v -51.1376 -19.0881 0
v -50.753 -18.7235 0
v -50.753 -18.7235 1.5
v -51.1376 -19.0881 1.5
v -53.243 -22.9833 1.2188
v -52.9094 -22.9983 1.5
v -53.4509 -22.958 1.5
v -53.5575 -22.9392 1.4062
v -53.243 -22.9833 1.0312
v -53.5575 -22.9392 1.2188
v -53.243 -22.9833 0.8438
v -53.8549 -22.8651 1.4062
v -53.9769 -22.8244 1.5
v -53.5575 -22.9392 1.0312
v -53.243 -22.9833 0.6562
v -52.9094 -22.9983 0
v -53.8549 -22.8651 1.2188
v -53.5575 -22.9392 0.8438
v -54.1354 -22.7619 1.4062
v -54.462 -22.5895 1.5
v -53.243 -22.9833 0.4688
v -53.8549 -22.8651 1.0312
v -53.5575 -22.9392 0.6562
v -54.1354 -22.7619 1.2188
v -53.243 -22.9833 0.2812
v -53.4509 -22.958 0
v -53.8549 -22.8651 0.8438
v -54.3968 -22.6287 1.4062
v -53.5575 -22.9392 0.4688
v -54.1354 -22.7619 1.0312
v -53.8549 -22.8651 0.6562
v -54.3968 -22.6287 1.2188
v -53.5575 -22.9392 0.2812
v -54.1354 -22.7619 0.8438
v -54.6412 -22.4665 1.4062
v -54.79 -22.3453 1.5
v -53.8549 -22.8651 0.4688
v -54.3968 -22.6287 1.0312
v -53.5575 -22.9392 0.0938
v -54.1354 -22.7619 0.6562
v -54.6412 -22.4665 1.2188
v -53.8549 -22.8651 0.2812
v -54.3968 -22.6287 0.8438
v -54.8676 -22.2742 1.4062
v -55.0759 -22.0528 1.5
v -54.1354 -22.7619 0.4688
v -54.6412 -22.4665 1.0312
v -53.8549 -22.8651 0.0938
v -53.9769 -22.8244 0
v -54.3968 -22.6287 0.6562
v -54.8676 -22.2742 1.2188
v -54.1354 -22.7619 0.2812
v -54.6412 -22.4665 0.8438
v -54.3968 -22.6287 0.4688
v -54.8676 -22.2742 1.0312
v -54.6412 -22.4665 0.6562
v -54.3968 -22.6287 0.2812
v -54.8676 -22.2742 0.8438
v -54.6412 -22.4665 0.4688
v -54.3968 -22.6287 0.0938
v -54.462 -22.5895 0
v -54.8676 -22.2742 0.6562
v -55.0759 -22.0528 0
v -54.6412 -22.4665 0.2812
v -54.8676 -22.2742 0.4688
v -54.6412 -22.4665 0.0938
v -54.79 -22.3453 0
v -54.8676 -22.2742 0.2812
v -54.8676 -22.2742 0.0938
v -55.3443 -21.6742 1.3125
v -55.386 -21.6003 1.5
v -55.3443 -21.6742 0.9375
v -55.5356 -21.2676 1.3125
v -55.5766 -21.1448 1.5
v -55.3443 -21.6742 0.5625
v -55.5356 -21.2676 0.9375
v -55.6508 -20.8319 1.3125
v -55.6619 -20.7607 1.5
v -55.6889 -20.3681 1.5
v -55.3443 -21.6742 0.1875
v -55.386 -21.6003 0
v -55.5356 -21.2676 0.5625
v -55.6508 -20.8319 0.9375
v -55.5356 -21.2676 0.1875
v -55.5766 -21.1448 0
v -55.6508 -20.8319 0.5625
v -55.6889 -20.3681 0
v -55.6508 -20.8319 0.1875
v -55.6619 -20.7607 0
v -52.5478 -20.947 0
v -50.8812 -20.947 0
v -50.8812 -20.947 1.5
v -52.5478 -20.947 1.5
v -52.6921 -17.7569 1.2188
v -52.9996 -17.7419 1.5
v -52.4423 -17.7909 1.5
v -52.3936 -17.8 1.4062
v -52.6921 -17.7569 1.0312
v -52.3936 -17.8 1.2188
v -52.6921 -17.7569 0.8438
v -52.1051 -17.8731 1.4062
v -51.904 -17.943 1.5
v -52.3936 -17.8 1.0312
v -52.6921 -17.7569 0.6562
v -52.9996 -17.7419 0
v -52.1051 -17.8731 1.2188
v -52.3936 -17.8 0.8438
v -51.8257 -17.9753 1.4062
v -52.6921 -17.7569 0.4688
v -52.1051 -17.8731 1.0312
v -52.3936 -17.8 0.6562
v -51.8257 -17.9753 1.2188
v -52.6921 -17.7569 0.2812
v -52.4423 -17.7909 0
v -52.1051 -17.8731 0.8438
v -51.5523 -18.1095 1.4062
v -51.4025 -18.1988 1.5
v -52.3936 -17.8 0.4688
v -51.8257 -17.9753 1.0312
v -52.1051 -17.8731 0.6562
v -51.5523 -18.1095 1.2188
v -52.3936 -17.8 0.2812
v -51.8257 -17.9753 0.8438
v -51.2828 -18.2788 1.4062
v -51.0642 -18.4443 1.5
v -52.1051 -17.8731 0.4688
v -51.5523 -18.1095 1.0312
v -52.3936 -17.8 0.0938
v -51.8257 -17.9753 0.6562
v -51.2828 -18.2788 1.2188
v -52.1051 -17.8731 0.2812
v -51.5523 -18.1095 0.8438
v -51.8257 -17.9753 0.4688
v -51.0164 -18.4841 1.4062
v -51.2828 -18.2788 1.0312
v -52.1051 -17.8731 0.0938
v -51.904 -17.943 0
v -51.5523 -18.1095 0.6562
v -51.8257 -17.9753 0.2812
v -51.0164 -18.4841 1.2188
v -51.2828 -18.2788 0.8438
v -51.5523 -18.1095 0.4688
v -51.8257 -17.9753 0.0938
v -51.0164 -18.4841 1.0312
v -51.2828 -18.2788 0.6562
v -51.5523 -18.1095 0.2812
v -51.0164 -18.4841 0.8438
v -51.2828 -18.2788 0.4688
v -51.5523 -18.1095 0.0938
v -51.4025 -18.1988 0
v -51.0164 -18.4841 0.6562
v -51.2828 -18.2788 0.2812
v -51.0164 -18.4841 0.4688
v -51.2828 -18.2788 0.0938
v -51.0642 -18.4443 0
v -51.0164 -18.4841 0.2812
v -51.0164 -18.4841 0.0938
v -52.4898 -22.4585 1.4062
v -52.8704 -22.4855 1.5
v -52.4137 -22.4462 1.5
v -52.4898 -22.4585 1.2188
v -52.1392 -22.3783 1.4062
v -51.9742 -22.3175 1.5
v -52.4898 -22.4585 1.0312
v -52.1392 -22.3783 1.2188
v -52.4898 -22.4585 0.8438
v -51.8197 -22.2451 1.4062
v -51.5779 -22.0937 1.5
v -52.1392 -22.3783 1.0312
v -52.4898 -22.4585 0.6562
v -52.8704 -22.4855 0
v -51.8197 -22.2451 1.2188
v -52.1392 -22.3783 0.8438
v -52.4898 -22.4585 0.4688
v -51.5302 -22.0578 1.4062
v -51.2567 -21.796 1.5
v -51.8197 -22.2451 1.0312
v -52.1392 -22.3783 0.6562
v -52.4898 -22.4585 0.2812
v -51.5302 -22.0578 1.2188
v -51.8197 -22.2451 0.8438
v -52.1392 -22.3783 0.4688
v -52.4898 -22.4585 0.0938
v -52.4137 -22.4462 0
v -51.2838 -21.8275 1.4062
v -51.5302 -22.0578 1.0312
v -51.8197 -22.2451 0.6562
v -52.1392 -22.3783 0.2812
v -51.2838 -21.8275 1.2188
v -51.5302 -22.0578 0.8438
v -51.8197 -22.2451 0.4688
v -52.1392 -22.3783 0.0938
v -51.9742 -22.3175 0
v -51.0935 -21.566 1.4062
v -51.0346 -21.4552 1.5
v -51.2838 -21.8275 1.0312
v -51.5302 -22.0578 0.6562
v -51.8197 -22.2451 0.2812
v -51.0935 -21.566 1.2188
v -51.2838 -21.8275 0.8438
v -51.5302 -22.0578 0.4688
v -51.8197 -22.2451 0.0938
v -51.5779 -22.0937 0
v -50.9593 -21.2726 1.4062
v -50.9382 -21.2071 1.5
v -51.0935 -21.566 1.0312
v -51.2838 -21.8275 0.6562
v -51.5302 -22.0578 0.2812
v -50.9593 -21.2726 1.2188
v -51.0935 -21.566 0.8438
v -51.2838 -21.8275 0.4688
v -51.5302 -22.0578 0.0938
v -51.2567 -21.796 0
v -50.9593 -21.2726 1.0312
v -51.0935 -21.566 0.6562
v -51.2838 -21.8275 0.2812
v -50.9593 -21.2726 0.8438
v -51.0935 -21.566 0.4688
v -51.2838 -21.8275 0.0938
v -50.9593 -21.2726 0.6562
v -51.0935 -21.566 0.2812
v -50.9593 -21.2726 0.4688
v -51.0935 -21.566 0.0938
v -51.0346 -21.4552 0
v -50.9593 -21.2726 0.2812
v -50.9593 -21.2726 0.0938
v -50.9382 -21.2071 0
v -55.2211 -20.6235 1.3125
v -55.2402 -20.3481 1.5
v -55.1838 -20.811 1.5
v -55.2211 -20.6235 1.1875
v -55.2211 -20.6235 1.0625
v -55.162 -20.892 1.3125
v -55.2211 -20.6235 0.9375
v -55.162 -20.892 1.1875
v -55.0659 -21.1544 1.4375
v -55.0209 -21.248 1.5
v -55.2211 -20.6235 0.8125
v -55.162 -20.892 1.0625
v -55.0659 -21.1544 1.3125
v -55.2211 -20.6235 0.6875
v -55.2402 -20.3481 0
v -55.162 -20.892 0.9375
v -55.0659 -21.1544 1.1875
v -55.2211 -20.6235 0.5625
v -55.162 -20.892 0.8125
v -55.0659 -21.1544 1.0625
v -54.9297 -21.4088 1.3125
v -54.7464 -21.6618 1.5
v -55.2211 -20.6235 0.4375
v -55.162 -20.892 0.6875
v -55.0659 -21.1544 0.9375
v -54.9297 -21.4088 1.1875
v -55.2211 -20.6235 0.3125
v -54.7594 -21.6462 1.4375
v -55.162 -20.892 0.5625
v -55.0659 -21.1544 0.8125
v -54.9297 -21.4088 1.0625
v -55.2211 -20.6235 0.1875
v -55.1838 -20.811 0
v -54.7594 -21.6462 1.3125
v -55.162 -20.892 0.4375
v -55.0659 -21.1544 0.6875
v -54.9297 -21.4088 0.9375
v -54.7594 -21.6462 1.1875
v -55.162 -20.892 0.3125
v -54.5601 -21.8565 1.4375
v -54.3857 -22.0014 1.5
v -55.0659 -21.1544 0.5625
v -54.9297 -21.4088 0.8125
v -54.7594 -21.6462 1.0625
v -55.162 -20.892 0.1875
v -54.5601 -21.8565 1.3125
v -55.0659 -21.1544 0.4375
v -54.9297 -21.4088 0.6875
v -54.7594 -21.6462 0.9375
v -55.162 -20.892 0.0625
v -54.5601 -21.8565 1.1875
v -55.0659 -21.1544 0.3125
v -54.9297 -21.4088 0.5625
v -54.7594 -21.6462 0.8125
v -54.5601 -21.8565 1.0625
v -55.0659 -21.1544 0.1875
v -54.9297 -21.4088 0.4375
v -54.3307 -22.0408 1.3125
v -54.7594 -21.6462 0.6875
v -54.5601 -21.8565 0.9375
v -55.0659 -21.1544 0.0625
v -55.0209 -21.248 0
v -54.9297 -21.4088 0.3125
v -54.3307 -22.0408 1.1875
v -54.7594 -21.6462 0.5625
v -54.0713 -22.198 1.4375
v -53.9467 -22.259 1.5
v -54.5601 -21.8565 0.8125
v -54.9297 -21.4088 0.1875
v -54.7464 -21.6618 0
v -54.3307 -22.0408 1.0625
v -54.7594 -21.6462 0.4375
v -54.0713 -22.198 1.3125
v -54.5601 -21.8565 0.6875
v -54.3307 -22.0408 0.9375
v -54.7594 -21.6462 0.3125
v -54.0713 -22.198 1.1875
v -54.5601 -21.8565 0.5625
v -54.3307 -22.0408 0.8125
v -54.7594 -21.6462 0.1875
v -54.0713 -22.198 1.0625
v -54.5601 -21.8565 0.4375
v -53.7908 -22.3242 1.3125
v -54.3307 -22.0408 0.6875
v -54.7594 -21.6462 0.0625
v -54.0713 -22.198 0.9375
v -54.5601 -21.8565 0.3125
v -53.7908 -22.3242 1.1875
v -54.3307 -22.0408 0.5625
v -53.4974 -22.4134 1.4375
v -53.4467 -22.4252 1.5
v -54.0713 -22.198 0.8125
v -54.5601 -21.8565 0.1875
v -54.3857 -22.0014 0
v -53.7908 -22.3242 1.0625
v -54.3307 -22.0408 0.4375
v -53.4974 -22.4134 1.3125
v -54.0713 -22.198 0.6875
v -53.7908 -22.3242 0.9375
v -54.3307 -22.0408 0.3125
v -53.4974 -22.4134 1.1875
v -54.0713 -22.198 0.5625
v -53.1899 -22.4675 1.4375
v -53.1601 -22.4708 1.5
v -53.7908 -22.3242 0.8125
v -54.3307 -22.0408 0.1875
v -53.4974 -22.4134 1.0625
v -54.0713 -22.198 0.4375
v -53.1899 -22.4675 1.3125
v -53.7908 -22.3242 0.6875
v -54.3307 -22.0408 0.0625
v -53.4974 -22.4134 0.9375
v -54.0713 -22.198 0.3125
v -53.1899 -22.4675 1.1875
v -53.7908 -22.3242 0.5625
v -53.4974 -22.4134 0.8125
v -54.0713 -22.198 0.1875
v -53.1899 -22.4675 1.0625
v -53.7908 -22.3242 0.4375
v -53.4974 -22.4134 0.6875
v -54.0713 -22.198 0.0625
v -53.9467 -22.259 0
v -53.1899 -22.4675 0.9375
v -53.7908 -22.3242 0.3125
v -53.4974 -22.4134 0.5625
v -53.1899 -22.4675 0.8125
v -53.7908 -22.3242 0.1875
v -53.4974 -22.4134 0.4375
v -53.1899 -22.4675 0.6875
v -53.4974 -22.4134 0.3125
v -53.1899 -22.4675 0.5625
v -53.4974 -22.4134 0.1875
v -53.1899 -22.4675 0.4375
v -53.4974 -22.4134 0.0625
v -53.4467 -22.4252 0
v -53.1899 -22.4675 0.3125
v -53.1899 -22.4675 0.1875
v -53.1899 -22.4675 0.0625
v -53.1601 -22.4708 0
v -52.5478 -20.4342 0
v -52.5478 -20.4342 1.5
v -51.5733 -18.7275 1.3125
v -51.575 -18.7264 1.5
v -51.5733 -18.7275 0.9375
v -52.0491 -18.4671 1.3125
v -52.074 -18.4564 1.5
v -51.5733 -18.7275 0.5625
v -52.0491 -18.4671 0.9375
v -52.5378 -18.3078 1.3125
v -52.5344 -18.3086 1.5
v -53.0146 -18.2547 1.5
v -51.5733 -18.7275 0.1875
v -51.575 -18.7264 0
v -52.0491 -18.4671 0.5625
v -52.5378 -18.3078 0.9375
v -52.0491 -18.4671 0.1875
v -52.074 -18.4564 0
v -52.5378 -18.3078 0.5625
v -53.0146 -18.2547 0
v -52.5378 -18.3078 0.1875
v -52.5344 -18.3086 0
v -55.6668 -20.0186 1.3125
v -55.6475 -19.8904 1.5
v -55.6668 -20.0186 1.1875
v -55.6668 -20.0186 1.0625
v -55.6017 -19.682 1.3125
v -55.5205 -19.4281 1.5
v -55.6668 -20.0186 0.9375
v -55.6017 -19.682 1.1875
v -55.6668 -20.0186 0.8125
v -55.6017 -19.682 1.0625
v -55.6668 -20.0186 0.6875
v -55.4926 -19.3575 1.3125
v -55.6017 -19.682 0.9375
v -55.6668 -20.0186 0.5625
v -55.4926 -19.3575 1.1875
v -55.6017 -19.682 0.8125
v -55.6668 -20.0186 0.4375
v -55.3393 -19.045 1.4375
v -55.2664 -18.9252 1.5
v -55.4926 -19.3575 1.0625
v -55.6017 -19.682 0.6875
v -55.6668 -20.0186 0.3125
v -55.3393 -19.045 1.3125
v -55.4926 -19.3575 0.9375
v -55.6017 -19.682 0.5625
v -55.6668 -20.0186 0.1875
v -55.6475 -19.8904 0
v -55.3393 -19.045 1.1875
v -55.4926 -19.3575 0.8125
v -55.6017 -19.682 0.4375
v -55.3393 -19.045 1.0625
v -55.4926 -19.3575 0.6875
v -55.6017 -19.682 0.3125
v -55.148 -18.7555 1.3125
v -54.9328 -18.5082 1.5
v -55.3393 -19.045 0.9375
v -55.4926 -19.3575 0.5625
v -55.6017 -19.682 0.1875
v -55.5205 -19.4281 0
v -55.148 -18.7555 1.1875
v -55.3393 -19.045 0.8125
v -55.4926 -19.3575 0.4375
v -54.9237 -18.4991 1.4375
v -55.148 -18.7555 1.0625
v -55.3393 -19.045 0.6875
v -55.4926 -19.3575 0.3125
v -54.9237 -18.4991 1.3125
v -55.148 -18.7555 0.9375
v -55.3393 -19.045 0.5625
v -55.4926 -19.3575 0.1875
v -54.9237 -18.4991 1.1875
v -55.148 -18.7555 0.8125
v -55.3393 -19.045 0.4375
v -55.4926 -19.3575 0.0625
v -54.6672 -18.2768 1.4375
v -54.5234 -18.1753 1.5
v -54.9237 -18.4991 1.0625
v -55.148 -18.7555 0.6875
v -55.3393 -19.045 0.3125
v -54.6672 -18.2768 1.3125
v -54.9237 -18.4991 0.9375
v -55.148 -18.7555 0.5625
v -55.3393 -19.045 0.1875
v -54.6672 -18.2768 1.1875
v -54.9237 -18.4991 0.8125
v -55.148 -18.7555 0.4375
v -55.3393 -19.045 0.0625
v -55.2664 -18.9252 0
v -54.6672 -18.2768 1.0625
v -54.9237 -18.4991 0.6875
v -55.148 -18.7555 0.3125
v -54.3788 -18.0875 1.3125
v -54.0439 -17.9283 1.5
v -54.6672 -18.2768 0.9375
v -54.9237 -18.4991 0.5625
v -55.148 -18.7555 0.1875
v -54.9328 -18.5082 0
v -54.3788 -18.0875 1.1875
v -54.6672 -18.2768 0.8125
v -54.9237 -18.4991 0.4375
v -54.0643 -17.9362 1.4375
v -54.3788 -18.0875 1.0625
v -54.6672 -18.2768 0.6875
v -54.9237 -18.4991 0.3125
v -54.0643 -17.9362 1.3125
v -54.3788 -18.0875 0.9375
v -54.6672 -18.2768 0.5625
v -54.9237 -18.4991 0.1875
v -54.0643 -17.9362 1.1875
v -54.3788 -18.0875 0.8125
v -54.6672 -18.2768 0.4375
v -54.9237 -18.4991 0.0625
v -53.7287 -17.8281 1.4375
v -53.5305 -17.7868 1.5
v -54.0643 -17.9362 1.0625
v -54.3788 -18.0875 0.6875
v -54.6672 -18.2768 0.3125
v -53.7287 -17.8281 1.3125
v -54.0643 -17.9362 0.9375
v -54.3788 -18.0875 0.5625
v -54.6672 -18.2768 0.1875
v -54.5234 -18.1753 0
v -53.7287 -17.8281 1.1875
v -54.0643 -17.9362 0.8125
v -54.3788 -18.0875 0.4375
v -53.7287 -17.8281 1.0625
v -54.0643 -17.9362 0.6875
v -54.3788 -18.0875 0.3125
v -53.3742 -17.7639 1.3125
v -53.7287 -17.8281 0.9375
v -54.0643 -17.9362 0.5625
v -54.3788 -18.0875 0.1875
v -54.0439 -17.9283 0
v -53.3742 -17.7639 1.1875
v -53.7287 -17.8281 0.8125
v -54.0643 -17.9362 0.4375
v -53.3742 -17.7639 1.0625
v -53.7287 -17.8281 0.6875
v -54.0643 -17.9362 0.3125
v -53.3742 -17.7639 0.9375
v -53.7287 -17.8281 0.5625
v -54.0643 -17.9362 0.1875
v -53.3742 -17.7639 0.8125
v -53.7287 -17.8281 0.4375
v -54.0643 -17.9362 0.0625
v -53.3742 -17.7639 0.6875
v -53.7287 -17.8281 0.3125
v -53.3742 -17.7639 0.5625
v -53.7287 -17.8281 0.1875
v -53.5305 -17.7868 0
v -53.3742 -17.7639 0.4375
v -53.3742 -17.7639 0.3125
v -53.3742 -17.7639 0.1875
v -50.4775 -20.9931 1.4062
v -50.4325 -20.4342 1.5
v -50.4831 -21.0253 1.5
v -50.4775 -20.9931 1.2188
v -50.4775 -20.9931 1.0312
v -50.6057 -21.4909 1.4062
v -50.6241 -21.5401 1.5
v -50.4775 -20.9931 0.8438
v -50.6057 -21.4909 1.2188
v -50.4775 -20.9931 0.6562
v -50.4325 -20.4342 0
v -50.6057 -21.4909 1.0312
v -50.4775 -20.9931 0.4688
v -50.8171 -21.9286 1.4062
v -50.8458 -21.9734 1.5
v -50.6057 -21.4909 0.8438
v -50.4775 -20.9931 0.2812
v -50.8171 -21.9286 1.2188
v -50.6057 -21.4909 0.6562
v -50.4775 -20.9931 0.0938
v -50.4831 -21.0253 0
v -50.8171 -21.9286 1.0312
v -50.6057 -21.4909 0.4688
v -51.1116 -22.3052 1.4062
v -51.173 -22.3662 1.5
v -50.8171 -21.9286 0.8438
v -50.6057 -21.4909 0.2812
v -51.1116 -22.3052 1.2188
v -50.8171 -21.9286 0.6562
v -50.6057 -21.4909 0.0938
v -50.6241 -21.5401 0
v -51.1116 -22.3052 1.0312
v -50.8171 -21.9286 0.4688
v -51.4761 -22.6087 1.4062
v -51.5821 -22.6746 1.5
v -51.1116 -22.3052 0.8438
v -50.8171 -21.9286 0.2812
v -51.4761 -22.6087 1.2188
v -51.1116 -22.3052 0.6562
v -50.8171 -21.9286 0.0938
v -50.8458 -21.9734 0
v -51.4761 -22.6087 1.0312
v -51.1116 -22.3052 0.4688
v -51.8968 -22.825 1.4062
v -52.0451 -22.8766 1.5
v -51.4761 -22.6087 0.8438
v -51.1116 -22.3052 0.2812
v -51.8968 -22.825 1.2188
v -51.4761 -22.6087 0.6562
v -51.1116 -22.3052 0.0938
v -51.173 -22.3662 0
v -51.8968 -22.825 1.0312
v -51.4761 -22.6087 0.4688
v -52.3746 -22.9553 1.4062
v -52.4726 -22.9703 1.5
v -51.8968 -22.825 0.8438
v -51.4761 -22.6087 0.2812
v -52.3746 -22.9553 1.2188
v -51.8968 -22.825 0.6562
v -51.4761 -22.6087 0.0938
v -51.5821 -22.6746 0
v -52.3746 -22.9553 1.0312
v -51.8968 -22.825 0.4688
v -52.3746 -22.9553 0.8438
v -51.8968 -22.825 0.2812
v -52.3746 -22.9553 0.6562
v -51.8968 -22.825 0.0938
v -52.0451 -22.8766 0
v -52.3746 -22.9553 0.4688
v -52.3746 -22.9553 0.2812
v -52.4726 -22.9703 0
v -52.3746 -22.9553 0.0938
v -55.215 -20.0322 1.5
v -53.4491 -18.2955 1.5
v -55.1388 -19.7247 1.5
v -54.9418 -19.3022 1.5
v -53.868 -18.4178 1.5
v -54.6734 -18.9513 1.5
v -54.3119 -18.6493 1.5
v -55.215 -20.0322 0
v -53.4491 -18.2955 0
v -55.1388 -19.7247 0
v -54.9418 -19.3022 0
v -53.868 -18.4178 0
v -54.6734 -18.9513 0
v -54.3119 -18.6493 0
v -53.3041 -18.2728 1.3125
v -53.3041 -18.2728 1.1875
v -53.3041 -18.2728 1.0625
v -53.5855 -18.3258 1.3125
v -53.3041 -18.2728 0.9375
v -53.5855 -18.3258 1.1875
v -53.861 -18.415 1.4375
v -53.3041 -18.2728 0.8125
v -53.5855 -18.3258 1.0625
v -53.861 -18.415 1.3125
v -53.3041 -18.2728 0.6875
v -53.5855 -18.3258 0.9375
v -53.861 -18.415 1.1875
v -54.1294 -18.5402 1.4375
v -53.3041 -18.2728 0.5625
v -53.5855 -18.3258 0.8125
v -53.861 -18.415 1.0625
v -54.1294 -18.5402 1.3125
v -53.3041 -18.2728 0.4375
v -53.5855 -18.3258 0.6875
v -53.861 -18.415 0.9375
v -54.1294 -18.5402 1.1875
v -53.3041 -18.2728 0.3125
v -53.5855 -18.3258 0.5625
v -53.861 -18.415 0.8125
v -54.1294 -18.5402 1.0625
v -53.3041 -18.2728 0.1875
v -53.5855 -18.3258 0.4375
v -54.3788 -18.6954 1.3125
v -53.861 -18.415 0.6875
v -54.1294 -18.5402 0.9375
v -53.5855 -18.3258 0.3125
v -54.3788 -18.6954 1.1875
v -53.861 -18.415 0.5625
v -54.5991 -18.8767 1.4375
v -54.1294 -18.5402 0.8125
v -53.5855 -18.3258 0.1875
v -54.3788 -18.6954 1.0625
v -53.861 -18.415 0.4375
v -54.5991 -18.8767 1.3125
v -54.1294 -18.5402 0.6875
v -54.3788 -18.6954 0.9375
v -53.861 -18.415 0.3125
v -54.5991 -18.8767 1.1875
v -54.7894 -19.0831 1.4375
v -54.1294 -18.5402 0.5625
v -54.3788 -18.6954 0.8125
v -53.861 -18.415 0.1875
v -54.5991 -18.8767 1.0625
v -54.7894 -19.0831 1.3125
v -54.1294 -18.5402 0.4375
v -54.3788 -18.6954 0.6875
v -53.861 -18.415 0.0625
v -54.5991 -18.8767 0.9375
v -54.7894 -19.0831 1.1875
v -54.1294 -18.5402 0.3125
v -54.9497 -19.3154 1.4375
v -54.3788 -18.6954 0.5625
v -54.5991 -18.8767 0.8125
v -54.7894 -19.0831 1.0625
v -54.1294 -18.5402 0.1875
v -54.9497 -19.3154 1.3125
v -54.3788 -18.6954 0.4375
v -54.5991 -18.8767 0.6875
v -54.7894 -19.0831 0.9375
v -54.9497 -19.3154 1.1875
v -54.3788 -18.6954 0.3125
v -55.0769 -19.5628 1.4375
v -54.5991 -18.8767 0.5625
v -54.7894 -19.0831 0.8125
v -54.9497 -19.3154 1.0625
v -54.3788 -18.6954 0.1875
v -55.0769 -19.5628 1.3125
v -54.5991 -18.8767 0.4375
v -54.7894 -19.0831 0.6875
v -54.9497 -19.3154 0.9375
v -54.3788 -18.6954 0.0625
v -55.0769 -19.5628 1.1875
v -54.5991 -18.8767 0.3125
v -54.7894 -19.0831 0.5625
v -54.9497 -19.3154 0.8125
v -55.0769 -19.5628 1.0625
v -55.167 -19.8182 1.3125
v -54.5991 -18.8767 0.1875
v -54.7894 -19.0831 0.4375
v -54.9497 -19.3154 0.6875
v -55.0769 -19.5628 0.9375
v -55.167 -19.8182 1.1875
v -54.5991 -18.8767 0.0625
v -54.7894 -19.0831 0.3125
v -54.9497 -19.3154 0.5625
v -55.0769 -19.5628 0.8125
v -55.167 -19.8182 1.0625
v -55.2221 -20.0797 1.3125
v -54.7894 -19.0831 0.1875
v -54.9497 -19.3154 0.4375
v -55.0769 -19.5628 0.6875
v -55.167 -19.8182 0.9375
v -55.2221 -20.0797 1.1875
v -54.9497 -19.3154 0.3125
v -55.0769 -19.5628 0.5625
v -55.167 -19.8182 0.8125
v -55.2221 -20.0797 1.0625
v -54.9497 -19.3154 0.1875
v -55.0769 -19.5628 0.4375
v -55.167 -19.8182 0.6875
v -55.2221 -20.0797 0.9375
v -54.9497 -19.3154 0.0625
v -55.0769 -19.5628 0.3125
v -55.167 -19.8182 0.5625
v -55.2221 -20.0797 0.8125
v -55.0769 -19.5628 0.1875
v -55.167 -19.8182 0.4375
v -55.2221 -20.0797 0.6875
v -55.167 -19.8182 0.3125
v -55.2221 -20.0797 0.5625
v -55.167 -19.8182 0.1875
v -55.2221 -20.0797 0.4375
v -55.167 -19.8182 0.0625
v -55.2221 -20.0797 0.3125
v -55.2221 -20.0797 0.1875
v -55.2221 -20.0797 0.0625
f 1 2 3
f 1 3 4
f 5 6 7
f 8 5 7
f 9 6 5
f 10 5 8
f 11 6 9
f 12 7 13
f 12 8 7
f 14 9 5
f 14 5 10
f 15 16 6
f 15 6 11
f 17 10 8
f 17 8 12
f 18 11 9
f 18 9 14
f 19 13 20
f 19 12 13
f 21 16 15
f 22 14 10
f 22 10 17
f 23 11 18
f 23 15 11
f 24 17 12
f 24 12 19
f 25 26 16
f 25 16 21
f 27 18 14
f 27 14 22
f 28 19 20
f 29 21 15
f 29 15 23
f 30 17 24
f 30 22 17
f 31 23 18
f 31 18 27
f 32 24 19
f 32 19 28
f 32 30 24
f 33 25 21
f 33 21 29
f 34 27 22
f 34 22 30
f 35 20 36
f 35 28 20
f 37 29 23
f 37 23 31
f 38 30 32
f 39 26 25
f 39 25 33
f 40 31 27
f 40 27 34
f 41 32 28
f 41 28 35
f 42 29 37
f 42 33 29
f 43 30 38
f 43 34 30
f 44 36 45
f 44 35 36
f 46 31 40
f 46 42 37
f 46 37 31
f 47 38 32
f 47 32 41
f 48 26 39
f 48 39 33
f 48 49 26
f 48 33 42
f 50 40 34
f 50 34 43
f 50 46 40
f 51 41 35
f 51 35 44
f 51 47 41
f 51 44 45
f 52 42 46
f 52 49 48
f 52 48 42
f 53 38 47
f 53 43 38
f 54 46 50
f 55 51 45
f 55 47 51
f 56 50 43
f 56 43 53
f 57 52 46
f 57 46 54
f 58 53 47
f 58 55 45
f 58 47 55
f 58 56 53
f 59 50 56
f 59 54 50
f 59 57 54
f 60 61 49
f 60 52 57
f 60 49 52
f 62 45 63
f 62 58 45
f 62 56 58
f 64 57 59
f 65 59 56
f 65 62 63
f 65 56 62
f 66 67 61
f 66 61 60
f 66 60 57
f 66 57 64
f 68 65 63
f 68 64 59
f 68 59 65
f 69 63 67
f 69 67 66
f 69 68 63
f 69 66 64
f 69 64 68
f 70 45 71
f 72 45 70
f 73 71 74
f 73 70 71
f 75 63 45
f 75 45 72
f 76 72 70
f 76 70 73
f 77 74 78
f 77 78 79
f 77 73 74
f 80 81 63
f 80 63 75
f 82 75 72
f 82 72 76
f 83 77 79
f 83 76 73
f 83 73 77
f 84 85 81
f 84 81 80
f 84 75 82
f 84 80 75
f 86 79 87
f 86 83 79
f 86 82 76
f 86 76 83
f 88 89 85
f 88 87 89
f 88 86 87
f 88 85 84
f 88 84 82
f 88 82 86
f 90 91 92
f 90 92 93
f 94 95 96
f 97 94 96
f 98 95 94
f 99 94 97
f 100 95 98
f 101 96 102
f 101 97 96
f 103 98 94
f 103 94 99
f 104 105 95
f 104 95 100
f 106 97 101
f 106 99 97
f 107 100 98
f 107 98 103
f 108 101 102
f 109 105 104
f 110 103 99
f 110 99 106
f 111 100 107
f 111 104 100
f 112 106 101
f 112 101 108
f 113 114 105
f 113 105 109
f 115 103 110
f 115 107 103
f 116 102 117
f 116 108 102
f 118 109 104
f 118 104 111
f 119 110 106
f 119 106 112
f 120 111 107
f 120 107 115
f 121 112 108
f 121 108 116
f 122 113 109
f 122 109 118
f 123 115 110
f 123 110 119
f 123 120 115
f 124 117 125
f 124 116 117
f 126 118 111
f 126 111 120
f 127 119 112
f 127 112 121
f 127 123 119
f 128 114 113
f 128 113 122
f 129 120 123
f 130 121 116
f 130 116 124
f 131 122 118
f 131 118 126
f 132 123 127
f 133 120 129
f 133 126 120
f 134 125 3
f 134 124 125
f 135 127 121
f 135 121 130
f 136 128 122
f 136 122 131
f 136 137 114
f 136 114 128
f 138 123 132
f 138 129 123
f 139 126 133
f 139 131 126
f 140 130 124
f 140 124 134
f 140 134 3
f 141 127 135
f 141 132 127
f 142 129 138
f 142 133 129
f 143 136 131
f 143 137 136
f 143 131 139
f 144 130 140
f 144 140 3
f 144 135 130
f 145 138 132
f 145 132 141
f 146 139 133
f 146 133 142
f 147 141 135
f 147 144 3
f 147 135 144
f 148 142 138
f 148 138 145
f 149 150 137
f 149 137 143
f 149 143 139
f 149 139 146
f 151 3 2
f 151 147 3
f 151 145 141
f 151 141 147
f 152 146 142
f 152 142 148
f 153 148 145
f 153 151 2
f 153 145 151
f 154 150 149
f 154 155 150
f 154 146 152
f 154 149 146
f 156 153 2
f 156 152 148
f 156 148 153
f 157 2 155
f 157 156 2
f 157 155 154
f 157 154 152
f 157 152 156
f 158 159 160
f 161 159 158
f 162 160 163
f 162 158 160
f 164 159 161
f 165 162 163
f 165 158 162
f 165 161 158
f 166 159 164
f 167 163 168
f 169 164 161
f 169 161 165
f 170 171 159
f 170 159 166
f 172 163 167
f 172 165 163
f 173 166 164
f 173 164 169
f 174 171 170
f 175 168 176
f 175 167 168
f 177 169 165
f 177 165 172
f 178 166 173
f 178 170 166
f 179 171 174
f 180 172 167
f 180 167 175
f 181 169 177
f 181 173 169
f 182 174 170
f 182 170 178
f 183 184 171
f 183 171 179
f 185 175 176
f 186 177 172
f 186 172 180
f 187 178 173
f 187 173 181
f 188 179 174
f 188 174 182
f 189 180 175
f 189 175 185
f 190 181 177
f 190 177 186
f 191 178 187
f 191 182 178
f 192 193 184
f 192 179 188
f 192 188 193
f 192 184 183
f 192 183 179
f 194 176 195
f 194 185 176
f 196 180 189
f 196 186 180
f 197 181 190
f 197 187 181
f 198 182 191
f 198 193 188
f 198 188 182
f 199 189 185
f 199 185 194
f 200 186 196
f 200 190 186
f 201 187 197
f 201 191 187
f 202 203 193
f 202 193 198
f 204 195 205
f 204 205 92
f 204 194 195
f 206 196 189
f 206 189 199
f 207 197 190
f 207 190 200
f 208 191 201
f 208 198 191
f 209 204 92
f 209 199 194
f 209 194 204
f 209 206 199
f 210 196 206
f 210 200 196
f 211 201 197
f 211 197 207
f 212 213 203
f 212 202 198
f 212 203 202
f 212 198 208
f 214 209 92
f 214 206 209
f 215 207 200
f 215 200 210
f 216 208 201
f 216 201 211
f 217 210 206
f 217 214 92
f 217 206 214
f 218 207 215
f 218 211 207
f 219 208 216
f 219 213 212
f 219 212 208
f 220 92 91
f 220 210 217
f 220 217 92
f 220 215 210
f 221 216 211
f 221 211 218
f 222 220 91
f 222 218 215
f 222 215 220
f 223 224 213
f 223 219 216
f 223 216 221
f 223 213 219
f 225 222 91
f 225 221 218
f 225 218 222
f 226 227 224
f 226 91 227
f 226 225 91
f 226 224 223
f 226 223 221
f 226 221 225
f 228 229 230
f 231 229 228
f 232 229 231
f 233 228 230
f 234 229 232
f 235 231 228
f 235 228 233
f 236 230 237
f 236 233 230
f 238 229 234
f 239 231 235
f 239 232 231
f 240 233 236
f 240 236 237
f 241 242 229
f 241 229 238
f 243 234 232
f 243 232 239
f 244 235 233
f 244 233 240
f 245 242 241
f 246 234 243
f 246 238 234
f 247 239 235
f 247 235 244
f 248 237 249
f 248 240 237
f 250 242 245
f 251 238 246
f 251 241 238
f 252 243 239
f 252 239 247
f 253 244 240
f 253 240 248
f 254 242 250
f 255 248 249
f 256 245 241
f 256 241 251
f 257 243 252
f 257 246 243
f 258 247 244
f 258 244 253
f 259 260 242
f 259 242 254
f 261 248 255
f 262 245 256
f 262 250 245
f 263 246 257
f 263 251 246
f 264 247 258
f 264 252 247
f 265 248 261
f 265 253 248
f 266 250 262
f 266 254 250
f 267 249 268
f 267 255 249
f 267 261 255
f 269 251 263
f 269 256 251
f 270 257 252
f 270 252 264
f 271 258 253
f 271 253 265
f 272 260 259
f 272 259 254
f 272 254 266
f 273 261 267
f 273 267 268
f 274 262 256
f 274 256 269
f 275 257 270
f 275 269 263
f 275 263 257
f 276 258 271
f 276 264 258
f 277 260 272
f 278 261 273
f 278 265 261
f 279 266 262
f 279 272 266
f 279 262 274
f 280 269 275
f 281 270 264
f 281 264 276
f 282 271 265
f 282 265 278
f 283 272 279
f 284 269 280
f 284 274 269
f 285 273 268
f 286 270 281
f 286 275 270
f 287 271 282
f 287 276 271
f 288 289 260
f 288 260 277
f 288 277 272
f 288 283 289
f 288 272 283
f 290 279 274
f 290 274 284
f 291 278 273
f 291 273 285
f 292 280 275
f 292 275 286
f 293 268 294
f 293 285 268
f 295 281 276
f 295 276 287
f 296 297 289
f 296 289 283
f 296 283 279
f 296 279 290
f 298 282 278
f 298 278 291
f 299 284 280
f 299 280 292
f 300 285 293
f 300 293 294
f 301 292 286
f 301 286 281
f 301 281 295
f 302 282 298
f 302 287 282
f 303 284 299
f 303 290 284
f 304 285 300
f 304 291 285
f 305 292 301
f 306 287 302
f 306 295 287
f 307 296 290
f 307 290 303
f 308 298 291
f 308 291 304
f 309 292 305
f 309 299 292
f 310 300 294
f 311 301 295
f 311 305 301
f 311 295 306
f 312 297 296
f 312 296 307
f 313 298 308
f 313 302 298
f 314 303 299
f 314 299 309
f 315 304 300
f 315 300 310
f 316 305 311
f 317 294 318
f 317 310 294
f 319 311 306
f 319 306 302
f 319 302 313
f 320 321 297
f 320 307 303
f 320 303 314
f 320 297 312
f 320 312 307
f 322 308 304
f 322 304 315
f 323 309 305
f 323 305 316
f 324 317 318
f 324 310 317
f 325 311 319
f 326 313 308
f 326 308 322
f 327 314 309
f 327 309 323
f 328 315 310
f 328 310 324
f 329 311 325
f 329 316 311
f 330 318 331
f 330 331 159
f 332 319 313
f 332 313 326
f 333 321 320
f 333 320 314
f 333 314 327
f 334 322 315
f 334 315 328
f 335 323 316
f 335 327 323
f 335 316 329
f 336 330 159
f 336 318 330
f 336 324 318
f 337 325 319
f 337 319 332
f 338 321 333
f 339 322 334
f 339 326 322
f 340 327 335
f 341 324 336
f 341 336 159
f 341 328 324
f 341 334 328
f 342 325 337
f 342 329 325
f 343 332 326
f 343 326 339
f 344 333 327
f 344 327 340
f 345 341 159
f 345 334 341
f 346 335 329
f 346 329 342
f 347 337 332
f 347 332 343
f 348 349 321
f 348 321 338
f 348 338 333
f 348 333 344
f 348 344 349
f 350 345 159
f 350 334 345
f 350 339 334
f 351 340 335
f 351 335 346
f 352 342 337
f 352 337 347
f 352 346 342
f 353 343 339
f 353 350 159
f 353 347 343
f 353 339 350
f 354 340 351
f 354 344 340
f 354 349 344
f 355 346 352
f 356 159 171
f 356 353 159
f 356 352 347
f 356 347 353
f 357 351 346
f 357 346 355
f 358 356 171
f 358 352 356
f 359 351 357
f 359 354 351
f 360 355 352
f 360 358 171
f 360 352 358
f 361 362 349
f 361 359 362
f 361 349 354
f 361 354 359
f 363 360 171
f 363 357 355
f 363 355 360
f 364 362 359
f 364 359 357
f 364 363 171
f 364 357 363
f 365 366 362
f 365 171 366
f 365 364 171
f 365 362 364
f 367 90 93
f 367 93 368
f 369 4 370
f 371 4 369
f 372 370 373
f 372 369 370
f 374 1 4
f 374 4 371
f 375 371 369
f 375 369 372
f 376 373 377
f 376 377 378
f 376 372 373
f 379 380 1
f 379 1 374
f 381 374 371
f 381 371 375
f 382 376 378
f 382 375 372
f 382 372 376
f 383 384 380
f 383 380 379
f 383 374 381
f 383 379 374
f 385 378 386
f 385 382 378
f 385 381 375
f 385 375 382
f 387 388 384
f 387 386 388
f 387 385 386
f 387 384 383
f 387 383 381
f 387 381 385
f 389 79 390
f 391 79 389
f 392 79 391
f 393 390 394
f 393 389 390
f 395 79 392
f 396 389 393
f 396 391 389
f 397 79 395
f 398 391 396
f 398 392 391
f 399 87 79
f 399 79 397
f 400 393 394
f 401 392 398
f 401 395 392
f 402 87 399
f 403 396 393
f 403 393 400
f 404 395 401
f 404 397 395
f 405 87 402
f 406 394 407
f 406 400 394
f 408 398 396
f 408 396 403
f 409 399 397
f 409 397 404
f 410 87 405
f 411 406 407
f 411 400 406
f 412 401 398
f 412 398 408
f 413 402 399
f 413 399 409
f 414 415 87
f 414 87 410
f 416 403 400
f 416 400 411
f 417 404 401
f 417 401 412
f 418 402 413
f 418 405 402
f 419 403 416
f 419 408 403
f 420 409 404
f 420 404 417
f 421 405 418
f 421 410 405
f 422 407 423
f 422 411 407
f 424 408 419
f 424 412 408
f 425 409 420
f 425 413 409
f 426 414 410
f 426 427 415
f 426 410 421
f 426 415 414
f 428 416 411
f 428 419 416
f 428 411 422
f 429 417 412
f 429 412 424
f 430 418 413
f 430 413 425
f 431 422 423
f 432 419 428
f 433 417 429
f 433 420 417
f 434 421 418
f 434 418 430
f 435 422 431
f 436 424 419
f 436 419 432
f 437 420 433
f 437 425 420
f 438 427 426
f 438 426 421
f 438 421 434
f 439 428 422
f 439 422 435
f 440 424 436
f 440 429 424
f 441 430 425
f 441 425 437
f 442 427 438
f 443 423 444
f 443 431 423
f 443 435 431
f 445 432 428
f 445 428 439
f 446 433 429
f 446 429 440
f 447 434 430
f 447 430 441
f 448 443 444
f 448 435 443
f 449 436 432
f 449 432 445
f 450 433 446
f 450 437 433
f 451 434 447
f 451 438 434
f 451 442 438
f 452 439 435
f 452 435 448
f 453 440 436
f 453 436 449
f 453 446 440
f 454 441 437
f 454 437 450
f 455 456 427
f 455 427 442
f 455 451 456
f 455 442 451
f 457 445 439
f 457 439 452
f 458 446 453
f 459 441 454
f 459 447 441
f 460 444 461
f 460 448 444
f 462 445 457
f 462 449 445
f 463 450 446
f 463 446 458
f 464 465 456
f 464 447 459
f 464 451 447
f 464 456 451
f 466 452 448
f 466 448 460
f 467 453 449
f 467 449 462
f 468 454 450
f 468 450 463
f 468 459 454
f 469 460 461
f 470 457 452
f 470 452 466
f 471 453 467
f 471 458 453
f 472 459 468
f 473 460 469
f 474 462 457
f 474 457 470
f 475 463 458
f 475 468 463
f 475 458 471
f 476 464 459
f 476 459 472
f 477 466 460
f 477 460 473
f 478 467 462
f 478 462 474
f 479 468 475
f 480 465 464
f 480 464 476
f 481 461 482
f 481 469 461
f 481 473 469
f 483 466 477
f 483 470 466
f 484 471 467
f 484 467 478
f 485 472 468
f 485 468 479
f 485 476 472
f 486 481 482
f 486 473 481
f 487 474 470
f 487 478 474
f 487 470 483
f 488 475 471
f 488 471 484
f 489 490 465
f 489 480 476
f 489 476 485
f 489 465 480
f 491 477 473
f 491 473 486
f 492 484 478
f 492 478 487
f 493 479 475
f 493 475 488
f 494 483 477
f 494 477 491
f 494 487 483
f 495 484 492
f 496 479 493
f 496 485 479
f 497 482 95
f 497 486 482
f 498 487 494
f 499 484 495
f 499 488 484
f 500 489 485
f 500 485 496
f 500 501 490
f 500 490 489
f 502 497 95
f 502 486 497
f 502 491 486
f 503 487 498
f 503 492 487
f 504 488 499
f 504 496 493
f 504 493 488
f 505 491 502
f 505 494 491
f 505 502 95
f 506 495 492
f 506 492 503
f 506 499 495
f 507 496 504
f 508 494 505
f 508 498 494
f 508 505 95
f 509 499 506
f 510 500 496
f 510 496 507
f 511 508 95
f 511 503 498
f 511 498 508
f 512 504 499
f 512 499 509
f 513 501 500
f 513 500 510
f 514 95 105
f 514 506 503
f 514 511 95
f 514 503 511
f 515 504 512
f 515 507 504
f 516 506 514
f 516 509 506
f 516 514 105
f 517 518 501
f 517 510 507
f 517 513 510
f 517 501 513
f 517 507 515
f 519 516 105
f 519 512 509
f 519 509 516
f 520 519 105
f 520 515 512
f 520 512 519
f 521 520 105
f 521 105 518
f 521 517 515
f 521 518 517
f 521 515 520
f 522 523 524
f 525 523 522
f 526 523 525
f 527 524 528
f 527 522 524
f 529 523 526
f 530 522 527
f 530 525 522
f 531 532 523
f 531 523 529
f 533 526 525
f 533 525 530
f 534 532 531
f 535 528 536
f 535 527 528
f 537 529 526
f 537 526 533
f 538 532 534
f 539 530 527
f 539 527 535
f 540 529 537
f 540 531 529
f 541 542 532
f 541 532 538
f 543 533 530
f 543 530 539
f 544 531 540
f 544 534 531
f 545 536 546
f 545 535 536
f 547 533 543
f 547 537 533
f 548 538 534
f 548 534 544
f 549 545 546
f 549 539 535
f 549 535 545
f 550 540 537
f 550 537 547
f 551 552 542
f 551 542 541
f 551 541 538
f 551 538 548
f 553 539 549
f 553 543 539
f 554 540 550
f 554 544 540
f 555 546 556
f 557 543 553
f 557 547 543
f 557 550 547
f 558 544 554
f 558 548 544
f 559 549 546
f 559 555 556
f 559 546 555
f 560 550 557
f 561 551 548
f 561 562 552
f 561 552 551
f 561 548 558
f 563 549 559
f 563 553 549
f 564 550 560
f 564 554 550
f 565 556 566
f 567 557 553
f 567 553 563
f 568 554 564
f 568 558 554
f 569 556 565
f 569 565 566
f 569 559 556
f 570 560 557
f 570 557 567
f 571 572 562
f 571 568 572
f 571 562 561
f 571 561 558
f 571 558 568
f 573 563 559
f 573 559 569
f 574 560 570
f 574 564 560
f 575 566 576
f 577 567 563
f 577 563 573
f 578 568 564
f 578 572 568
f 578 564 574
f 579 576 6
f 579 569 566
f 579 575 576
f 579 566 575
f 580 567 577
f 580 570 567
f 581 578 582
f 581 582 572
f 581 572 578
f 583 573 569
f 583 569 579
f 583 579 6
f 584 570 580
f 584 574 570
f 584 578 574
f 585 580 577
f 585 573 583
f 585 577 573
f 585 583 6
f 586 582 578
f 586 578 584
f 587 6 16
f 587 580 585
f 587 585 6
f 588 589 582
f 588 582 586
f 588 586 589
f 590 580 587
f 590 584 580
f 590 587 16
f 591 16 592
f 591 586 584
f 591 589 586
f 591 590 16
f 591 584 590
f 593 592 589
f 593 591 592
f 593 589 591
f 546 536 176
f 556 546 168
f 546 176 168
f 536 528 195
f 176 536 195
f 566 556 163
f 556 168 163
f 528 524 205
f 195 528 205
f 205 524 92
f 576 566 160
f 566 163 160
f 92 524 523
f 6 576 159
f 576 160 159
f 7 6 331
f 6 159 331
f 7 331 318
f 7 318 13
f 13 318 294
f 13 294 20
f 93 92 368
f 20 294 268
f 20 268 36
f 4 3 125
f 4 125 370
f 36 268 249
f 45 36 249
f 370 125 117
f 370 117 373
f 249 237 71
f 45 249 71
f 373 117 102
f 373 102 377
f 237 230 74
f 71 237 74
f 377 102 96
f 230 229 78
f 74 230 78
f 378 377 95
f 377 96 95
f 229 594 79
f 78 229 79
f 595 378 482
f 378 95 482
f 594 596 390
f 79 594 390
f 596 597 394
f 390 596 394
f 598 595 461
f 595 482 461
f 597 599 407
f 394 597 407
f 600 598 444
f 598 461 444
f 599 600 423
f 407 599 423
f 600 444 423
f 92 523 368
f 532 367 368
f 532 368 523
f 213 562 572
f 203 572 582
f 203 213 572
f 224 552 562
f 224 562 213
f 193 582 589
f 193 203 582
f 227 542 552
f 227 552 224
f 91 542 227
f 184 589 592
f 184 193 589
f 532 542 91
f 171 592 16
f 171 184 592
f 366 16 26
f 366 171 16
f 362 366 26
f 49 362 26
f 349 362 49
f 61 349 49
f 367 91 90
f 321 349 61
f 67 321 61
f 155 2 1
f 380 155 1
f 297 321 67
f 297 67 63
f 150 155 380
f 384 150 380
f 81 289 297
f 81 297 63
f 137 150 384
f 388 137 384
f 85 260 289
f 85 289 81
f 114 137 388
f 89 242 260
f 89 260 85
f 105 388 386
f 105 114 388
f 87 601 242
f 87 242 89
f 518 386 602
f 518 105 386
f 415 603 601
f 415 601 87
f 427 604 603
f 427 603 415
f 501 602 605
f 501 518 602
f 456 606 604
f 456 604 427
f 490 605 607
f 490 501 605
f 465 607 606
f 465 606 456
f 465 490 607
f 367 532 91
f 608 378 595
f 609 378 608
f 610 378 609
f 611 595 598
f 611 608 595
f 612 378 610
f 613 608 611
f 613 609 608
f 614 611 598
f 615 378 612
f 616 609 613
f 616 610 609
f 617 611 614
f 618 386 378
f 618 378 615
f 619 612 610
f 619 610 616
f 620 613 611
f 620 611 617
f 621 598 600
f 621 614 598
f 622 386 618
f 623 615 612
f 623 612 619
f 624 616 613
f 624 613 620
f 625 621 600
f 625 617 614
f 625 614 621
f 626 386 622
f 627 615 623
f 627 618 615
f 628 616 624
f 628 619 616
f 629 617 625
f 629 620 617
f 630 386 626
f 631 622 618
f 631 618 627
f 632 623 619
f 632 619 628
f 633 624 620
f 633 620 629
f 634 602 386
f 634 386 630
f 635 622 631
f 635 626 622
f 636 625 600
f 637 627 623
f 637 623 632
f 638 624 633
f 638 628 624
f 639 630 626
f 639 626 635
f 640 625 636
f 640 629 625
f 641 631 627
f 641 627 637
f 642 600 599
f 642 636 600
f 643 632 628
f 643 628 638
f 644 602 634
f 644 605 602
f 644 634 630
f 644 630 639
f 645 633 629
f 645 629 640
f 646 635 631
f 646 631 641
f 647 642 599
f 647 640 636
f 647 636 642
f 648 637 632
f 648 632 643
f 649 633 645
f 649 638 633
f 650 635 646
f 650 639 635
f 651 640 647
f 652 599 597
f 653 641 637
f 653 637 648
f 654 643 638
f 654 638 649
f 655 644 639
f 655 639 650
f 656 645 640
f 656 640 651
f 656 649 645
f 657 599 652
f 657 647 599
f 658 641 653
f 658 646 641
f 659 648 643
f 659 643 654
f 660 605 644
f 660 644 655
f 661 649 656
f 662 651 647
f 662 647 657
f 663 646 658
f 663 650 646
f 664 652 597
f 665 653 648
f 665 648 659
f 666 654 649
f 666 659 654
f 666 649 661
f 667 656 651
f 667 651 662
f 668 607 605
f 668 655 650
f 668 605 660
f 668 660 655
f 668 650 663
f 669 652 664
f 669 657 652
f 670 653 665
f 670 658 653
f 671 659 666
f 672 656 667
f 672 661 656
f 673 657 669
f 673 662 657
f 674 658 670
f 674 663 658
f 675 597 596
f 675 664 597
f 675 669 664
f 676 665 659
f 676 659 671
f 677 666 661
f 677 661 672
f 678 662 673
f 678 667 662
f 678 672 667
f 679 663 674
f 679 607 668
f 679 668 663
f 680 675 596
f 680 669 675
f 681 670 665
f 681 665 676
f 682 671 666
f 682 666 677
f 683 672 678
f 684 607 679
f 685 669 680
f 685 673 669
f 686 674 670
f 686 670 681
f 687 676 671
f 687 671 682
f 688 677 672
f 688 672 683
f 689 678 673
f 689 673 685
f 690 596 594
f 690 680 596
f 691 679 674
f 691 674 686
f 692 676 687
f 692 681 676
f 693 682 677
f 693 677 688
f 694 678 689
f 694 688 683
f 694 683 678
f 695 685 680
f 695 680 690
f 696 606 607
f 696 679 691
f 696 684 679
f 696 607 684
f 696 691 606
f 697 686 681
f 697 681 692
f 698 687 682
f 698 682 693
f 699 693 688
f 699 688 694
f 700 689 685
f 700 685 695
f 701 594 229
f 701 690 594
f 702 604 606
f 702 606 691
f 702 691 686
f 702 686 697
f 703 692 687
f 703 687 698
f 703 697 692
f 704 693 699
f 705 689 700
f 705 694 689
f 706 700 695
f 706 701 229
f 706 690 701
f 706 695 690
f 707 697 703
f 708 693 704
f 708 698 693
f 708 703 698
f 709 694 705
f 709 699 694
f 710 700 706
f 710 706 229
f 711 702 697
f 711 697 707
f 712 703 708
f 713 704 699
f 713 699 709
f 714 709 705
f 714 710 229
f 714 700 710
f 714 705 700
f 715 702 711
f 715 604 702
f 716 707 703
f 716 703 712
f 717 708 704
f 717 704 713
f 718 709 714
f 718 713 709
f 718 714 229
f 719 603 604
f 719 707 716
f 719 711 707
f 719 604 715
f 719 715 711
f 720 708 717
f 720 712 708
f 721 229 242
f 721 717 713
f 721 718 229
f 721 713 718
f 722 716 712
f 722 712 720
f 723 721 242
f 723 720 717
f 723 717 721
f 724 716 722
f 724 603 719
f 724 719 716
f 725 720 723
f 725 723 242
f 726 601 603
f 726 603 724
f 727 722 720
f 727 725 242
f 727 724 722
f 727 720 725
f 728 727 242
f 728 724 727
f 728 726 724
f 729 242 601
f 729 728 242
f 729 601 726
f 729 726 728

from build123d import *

# Parameters (mm, degrees)
BOSS_EXTRU_1_DEPTH = 1.5


with BuildPart() as part:
    # Esquisse1 → Boss.-Extru.1 (new body)
    with BuildSketch(Plane.XY):
        with BuildLine():
            Line((-50.752978146, -18.723484461), (-51.137593531, -19.088067794))
            add(Edge.make_bspline(
                [(-51.137593531, -19.088067794), (-51.207191943, -19.022595133), (-51.344729152, -18.893211043), (-51.56895807, -18.725338193), (-51.802906119, -18.581529478), (-52.045352543, -18.464520569), (-52.290293334, -18.371159483), (-52.5344773, -18.304690711), (-52.775399731, -18.262301372), (-52.935638614, -18.257232272), (-53.014596736, -18.254734461)],
                knots=[0, 0, 0, 0, 1.08915593, 2.152340314, 3.188132944, 4.216796309, 5.218260357, 6.173443236, 7.099959455, 8, 8, 8, 8], degree=3))
            add(Edge.make_bspline(
                [(-53.014596736, -18.254734461), (-53.063046307, -18.255325326), (-53.159819794, -18.256505525), (-53.303565428, -18.27156869), (-53.445803481, -18.293232781), (-53.586265445, -18.324578321), (-53.725224426, -18.364305549), (-53.862197129, -18.413999068), (-53.997439064, -18.471935131), (-54.129676323, -18.538881522), (-54.257877042, -18.61242416), (-54.378958236, -18.693922075), (-54.493691663, -18.780763203), (-54.599920842, -18.875121745), (-54.698256823, -18.976142981), (-54.791040211, -19.081947704), (-54.875007777, -19.195426588), (-54.950852298, -19.314491768), (-55.018511753, -19.437052039), (-55.078238401, -19.561927738), (-55.128377098, -19.688704673), (-55.168047749, -19.817541927), (-55.200777254, -19.94744277), (-55.223802408, -20.079306656), (-55.236783439, -20.213274778), (-55.239028839, -20.302985147), (-55.240157634, -20.34808382)],
                knots=[0, 0, 0, 0, 1.02818874, 2.053710826, 3.065248034, 4.081641283, 5.106893873, 6.131558223, 7.173050175, 8.228653731, 9.27666206, 10.308777013, 11.325269123, 12.329503258, 13.32196095, 14.316845687, 15.314881793, 16.315733098, 17.311955233, 18.285320748, 19.252783886, 20.203351036, 21.145449891, 22.095197417, 23.042428769, 24, 24, 24, 24], degree=3))
            add(Edge.make_bspline(
                [(-55.240157634, -20.34808382), (-55.239078036, -20.394184987), (-55.236921789, -20.486261435), (-55.223121332, -20.623681539), (-55.19750956, -20.759060685), (-55.163269976, -20.892843733), (-55.12044024, -21.025259801), (-55.067050717, -21.155734815), (-55.003814145, -21.284263945), (-54.93061907, -21.409689112), (-54.850353065, -21.53186486), (-54.760434378, -21.646949891), (-54.664919259, -21.756476716), (-54.560327973, -21.858013521), (-54.450014342, -21.95427623), (-54.330682519, -22.04261269), (-54.204679004, -22.124724438), (-54.071811558, -22.199576608), (-53.933521869, -22.266445945), (-53.791726508, -22.325908654), (-53.645972485, -22.374879135), (-53.497025786, -22.414790713), (-53.345063969, -22.447505423), (-53.189315679, -22.468551823), (-53.030926096, -22.483824439), (-52.924156622, -22.48494111), (-52.870365967, -22.485503692)],
                knots=[0, 0, 0, 0, 0.93586088, 1.869166235, 2.799637598, 3.729985548, 4.670839027, 5.622275134, 6.589130586, 7.576015415, 8.568469353, 9.55398029, 10.53834874, 11.515998671, 12.510579167, 13.508179873, 14.527009472, 15.561807829, 16.601455013, 17.643573243, 18.680854198, 19.719860599, 20.772568776, 21.833555941, 22.908541556, 24, 24, 24, 24], degree=3))
            add(Edge.make_bspline(
                [(-52.870365967, -22.485503692), (-52.805539757, -22.484148583), (-52.67824296, -22.481487606), (-52.491119471, -22.460772907), (-52.311400798, -22.428420344), (-52.139591937, -22.381040492), (-51.975493336, -22.320606671), (-51.818503419, -22.247756118), (-51.669858193, -22.159694605), (-51.529110802, -22.060303367), (-51.39945768, -21.949567892), (-51.282523217, -21.830075813), (-51.180172518, -21.702407146), (-51.090880091, -21.567313839), (-51.017010584, -21.423677689), (-50.95637802, -21.2722026), (-50.909901889, -21.11282044), (-50.890823354, -21.002689537), (-50.881183275, -20.947042153)],
                knots=[0, 0, 0, 0, 1.13008108, 2.219097802, 3.278683437, 4.311054135, 5.322181354, 6.324827112, 7.324222904, 8.330512327, 9.32562643, 10.293043162, 11.24128371, 12.174520618, 13.111833804, 14.052305215, 15.015860969, 16, 16, 16, 16], degree=3))
            Line((-50.881183275, -20.947042153), (-52.547849941, -20.947042153))
            Line((-52.547849941, -20.947042153), (-52.547849941, -20.43422164))
            Line((-52.547849941, -20.43422164), (-50.432465326, -20.43422164))
            add(Edge.make_bspline(
                [(-50.432465326, -20.43422164), (-50.434902252, -20.529803767), (-50.439671757, -20.716875255), (-50.473127351, -20.989689928), (-50.52715094, -21.247363776), (-50.600951385, -21.490168164), (-50.6964875, -21.717759011), (-50.812733969, -21.930367391), (-50.951551285, -22.126619792), (-51.107994773, -22.308118369), (-51.283566141, -22.470017243), (-51.473521313, -22.61231144), (-51.678174124, -22.732172319), (-51.897330992, -22.829687551), (-52.130274469, -22.905793258), (-52.377543583, -22.959752654), (-52.638803012, -22.992081173), (-52.817855408, -22.996211715), (-52.909428467, -22.998324204)],
                knots=[0, 0, 0, 0, 1.140356446, 2.231883559, 3.274166699, 4.278491846, 5.25512956, 6.21435461, 7.1637429, 8.11826594, 9.068280886, 10.0076534, 10.945064095, 11.891975133, 12.864533718, 13.863980011, 14.907571808, 16, 16, 16, 16], degree=3))
            add(Edge.make_bspline(
                [(-52.909428467, -22.998324204), (-52.965871517, -22.997511174), (-53.077195404, -22.995907616), (-53.241611016, -22.984511406), (-53.401493331, -22.966967725), (-53.556819058, -22.940474692), (-53.708159547, -22.908025186), (-53.854758954, -22.86647273), (-53.997175728, -22.818374588), (-54.135629993, -22.763666483), (-54.26886506, -22.700278402), (-54.39747437, -22.62983606), (-54.522168836, -22.552702688), (-54.642099071, -22.467544337), (-54.757889959, -22.374997965), (-54.868794878, -22.274878081), (-54.975434704, -22.167490767), (-55.042235366, -22.091235039), (-55.075894813, -22.052811384)],
                knots=[0, 0, 0, 0, 1.107784379, 2.184907829, 3.233506516, 4.263428166, 5.276301166, 6.270063455, 7.25232949, 8.225834625, 9.190232166, 10.146266622, 11.1027726, 12.066435141, 13.031522626, 14.010570082, 14.99756817, 16, 16, 16, 16], degree=3))
            add(Edge.make_bspline(
                [(-55.075894813, -22.052811384), (-55.124731859, -21.991853308), (-55.221595305, -21.870948998), (-55.346278386, -21.677234792), (-55.452566105, -21.476660706), (-55.53880585, -21.268668379), (-55.606145974, -21.053452361), (-55.654440621, -20.831287659), (-55.682736748, -20.601888187), (-55.68681323, -20.446652095), (-55.688875582, -20.368115871)],
                knots=[0, 0, 0, 0, 1.023165419, 2.029347347, 3.013907458, 3.994755782, 4.975994455, 5.96558838, 6.970761222, 8, 8, 8, 8], degree=3))
            add(Edge.make_bspline(
                [(-55.688875582, -20.368115871), (-55.688115242, -20.309306939), (-55.686604225, -20.192436499), (-55.668282059, -20.01892606), (-55.641994319, -19.8484965), (-55.60335567, -19.681287134), (-55.55464672, -19.517186289), (-55.493856026, -19.356117769), (-55.423077603, -19.197986524), (-55.340812609, -19.043880998), (-55.249263381, -18.895846122), (-55.149905923, -18.754477832), (-55.041329351, -18.622350596), (-54.925306781, -18.497791099), (-54.800453937, -18.382364174), (-54.667940475, -18.275001159), (-54.527664271, -18.175558037), (-54.379184014, -18.08560113), (-54.224715893, -18.004795958), (-54.064630177, -17.933954227), (-53.898975733, -17.875406633), (-53.728993622, -17.825729805), (-53.553397192, -17.78899389), (-53.373460711, -17.762352825), (-53.188246265, -17.744123397), (-53.063051938, -17.742657317), (-52.999572698, -17.741913948)],
                knots=[0, 0, 0, 0, 1.008945113, 2.00506715, 2.99143336, 3.967273523, 4.948097931, 5.927297278, 6.919902385, 7.919676788, 8.923139349, 9.905703106, 10.883022732, 11.856032218, 12.825136022, 13.798837087, 14.781400844, 15.773989409, 16.776158564, 17.77167057, 18.775803737, 19.789618931, 20.80898985, 21.851988756, 22.910860228, 24, 24, 24, 24], degree=3))
            add(Edge.make_bspline(
                [(-52.999572698, -17.741913948), (-52.947803778, -17.742741793), (-52.845152094, -17.744383313), (-52.692401048, -17.755761382), (-52.542011027, -17.773795498), (-52.393759042, -17.798405193), (-52.248149947, -17.831924751), (-52.104768939, -17.872036586), (-51.963408173, -17.91873919), (-51.824510674, -17.974437542), (-51.687142509, -18.037657006), (-51.550539879, -18.108819038), (-51.415169528, -18.189140473), (-51.280796697, -18.27885981), (-51.146574043, -18.376436121), (-51.014624554, -18.484660155), (-50.881763205, -18.599264092), (-50.796332042, -18.681667211), (-50.752978146, -18.723484461)],
                knots=[0, 0, 0, 0, 0.985871117, 1.954866573, 2.915460327, 3.869826059, 4.81536089, 5.759505086, 6.70452669, 7.649098992, 8.607881297, 9.583363685, 10.581137262, 11.603961102, 12.659522466, 13.73993555, 14.853081303, 16, 16, 16, 16], degree=3))
        make_face()
    extrude(amount=BOSS_EXTRU_1_DEPTH)


solid = part.part
